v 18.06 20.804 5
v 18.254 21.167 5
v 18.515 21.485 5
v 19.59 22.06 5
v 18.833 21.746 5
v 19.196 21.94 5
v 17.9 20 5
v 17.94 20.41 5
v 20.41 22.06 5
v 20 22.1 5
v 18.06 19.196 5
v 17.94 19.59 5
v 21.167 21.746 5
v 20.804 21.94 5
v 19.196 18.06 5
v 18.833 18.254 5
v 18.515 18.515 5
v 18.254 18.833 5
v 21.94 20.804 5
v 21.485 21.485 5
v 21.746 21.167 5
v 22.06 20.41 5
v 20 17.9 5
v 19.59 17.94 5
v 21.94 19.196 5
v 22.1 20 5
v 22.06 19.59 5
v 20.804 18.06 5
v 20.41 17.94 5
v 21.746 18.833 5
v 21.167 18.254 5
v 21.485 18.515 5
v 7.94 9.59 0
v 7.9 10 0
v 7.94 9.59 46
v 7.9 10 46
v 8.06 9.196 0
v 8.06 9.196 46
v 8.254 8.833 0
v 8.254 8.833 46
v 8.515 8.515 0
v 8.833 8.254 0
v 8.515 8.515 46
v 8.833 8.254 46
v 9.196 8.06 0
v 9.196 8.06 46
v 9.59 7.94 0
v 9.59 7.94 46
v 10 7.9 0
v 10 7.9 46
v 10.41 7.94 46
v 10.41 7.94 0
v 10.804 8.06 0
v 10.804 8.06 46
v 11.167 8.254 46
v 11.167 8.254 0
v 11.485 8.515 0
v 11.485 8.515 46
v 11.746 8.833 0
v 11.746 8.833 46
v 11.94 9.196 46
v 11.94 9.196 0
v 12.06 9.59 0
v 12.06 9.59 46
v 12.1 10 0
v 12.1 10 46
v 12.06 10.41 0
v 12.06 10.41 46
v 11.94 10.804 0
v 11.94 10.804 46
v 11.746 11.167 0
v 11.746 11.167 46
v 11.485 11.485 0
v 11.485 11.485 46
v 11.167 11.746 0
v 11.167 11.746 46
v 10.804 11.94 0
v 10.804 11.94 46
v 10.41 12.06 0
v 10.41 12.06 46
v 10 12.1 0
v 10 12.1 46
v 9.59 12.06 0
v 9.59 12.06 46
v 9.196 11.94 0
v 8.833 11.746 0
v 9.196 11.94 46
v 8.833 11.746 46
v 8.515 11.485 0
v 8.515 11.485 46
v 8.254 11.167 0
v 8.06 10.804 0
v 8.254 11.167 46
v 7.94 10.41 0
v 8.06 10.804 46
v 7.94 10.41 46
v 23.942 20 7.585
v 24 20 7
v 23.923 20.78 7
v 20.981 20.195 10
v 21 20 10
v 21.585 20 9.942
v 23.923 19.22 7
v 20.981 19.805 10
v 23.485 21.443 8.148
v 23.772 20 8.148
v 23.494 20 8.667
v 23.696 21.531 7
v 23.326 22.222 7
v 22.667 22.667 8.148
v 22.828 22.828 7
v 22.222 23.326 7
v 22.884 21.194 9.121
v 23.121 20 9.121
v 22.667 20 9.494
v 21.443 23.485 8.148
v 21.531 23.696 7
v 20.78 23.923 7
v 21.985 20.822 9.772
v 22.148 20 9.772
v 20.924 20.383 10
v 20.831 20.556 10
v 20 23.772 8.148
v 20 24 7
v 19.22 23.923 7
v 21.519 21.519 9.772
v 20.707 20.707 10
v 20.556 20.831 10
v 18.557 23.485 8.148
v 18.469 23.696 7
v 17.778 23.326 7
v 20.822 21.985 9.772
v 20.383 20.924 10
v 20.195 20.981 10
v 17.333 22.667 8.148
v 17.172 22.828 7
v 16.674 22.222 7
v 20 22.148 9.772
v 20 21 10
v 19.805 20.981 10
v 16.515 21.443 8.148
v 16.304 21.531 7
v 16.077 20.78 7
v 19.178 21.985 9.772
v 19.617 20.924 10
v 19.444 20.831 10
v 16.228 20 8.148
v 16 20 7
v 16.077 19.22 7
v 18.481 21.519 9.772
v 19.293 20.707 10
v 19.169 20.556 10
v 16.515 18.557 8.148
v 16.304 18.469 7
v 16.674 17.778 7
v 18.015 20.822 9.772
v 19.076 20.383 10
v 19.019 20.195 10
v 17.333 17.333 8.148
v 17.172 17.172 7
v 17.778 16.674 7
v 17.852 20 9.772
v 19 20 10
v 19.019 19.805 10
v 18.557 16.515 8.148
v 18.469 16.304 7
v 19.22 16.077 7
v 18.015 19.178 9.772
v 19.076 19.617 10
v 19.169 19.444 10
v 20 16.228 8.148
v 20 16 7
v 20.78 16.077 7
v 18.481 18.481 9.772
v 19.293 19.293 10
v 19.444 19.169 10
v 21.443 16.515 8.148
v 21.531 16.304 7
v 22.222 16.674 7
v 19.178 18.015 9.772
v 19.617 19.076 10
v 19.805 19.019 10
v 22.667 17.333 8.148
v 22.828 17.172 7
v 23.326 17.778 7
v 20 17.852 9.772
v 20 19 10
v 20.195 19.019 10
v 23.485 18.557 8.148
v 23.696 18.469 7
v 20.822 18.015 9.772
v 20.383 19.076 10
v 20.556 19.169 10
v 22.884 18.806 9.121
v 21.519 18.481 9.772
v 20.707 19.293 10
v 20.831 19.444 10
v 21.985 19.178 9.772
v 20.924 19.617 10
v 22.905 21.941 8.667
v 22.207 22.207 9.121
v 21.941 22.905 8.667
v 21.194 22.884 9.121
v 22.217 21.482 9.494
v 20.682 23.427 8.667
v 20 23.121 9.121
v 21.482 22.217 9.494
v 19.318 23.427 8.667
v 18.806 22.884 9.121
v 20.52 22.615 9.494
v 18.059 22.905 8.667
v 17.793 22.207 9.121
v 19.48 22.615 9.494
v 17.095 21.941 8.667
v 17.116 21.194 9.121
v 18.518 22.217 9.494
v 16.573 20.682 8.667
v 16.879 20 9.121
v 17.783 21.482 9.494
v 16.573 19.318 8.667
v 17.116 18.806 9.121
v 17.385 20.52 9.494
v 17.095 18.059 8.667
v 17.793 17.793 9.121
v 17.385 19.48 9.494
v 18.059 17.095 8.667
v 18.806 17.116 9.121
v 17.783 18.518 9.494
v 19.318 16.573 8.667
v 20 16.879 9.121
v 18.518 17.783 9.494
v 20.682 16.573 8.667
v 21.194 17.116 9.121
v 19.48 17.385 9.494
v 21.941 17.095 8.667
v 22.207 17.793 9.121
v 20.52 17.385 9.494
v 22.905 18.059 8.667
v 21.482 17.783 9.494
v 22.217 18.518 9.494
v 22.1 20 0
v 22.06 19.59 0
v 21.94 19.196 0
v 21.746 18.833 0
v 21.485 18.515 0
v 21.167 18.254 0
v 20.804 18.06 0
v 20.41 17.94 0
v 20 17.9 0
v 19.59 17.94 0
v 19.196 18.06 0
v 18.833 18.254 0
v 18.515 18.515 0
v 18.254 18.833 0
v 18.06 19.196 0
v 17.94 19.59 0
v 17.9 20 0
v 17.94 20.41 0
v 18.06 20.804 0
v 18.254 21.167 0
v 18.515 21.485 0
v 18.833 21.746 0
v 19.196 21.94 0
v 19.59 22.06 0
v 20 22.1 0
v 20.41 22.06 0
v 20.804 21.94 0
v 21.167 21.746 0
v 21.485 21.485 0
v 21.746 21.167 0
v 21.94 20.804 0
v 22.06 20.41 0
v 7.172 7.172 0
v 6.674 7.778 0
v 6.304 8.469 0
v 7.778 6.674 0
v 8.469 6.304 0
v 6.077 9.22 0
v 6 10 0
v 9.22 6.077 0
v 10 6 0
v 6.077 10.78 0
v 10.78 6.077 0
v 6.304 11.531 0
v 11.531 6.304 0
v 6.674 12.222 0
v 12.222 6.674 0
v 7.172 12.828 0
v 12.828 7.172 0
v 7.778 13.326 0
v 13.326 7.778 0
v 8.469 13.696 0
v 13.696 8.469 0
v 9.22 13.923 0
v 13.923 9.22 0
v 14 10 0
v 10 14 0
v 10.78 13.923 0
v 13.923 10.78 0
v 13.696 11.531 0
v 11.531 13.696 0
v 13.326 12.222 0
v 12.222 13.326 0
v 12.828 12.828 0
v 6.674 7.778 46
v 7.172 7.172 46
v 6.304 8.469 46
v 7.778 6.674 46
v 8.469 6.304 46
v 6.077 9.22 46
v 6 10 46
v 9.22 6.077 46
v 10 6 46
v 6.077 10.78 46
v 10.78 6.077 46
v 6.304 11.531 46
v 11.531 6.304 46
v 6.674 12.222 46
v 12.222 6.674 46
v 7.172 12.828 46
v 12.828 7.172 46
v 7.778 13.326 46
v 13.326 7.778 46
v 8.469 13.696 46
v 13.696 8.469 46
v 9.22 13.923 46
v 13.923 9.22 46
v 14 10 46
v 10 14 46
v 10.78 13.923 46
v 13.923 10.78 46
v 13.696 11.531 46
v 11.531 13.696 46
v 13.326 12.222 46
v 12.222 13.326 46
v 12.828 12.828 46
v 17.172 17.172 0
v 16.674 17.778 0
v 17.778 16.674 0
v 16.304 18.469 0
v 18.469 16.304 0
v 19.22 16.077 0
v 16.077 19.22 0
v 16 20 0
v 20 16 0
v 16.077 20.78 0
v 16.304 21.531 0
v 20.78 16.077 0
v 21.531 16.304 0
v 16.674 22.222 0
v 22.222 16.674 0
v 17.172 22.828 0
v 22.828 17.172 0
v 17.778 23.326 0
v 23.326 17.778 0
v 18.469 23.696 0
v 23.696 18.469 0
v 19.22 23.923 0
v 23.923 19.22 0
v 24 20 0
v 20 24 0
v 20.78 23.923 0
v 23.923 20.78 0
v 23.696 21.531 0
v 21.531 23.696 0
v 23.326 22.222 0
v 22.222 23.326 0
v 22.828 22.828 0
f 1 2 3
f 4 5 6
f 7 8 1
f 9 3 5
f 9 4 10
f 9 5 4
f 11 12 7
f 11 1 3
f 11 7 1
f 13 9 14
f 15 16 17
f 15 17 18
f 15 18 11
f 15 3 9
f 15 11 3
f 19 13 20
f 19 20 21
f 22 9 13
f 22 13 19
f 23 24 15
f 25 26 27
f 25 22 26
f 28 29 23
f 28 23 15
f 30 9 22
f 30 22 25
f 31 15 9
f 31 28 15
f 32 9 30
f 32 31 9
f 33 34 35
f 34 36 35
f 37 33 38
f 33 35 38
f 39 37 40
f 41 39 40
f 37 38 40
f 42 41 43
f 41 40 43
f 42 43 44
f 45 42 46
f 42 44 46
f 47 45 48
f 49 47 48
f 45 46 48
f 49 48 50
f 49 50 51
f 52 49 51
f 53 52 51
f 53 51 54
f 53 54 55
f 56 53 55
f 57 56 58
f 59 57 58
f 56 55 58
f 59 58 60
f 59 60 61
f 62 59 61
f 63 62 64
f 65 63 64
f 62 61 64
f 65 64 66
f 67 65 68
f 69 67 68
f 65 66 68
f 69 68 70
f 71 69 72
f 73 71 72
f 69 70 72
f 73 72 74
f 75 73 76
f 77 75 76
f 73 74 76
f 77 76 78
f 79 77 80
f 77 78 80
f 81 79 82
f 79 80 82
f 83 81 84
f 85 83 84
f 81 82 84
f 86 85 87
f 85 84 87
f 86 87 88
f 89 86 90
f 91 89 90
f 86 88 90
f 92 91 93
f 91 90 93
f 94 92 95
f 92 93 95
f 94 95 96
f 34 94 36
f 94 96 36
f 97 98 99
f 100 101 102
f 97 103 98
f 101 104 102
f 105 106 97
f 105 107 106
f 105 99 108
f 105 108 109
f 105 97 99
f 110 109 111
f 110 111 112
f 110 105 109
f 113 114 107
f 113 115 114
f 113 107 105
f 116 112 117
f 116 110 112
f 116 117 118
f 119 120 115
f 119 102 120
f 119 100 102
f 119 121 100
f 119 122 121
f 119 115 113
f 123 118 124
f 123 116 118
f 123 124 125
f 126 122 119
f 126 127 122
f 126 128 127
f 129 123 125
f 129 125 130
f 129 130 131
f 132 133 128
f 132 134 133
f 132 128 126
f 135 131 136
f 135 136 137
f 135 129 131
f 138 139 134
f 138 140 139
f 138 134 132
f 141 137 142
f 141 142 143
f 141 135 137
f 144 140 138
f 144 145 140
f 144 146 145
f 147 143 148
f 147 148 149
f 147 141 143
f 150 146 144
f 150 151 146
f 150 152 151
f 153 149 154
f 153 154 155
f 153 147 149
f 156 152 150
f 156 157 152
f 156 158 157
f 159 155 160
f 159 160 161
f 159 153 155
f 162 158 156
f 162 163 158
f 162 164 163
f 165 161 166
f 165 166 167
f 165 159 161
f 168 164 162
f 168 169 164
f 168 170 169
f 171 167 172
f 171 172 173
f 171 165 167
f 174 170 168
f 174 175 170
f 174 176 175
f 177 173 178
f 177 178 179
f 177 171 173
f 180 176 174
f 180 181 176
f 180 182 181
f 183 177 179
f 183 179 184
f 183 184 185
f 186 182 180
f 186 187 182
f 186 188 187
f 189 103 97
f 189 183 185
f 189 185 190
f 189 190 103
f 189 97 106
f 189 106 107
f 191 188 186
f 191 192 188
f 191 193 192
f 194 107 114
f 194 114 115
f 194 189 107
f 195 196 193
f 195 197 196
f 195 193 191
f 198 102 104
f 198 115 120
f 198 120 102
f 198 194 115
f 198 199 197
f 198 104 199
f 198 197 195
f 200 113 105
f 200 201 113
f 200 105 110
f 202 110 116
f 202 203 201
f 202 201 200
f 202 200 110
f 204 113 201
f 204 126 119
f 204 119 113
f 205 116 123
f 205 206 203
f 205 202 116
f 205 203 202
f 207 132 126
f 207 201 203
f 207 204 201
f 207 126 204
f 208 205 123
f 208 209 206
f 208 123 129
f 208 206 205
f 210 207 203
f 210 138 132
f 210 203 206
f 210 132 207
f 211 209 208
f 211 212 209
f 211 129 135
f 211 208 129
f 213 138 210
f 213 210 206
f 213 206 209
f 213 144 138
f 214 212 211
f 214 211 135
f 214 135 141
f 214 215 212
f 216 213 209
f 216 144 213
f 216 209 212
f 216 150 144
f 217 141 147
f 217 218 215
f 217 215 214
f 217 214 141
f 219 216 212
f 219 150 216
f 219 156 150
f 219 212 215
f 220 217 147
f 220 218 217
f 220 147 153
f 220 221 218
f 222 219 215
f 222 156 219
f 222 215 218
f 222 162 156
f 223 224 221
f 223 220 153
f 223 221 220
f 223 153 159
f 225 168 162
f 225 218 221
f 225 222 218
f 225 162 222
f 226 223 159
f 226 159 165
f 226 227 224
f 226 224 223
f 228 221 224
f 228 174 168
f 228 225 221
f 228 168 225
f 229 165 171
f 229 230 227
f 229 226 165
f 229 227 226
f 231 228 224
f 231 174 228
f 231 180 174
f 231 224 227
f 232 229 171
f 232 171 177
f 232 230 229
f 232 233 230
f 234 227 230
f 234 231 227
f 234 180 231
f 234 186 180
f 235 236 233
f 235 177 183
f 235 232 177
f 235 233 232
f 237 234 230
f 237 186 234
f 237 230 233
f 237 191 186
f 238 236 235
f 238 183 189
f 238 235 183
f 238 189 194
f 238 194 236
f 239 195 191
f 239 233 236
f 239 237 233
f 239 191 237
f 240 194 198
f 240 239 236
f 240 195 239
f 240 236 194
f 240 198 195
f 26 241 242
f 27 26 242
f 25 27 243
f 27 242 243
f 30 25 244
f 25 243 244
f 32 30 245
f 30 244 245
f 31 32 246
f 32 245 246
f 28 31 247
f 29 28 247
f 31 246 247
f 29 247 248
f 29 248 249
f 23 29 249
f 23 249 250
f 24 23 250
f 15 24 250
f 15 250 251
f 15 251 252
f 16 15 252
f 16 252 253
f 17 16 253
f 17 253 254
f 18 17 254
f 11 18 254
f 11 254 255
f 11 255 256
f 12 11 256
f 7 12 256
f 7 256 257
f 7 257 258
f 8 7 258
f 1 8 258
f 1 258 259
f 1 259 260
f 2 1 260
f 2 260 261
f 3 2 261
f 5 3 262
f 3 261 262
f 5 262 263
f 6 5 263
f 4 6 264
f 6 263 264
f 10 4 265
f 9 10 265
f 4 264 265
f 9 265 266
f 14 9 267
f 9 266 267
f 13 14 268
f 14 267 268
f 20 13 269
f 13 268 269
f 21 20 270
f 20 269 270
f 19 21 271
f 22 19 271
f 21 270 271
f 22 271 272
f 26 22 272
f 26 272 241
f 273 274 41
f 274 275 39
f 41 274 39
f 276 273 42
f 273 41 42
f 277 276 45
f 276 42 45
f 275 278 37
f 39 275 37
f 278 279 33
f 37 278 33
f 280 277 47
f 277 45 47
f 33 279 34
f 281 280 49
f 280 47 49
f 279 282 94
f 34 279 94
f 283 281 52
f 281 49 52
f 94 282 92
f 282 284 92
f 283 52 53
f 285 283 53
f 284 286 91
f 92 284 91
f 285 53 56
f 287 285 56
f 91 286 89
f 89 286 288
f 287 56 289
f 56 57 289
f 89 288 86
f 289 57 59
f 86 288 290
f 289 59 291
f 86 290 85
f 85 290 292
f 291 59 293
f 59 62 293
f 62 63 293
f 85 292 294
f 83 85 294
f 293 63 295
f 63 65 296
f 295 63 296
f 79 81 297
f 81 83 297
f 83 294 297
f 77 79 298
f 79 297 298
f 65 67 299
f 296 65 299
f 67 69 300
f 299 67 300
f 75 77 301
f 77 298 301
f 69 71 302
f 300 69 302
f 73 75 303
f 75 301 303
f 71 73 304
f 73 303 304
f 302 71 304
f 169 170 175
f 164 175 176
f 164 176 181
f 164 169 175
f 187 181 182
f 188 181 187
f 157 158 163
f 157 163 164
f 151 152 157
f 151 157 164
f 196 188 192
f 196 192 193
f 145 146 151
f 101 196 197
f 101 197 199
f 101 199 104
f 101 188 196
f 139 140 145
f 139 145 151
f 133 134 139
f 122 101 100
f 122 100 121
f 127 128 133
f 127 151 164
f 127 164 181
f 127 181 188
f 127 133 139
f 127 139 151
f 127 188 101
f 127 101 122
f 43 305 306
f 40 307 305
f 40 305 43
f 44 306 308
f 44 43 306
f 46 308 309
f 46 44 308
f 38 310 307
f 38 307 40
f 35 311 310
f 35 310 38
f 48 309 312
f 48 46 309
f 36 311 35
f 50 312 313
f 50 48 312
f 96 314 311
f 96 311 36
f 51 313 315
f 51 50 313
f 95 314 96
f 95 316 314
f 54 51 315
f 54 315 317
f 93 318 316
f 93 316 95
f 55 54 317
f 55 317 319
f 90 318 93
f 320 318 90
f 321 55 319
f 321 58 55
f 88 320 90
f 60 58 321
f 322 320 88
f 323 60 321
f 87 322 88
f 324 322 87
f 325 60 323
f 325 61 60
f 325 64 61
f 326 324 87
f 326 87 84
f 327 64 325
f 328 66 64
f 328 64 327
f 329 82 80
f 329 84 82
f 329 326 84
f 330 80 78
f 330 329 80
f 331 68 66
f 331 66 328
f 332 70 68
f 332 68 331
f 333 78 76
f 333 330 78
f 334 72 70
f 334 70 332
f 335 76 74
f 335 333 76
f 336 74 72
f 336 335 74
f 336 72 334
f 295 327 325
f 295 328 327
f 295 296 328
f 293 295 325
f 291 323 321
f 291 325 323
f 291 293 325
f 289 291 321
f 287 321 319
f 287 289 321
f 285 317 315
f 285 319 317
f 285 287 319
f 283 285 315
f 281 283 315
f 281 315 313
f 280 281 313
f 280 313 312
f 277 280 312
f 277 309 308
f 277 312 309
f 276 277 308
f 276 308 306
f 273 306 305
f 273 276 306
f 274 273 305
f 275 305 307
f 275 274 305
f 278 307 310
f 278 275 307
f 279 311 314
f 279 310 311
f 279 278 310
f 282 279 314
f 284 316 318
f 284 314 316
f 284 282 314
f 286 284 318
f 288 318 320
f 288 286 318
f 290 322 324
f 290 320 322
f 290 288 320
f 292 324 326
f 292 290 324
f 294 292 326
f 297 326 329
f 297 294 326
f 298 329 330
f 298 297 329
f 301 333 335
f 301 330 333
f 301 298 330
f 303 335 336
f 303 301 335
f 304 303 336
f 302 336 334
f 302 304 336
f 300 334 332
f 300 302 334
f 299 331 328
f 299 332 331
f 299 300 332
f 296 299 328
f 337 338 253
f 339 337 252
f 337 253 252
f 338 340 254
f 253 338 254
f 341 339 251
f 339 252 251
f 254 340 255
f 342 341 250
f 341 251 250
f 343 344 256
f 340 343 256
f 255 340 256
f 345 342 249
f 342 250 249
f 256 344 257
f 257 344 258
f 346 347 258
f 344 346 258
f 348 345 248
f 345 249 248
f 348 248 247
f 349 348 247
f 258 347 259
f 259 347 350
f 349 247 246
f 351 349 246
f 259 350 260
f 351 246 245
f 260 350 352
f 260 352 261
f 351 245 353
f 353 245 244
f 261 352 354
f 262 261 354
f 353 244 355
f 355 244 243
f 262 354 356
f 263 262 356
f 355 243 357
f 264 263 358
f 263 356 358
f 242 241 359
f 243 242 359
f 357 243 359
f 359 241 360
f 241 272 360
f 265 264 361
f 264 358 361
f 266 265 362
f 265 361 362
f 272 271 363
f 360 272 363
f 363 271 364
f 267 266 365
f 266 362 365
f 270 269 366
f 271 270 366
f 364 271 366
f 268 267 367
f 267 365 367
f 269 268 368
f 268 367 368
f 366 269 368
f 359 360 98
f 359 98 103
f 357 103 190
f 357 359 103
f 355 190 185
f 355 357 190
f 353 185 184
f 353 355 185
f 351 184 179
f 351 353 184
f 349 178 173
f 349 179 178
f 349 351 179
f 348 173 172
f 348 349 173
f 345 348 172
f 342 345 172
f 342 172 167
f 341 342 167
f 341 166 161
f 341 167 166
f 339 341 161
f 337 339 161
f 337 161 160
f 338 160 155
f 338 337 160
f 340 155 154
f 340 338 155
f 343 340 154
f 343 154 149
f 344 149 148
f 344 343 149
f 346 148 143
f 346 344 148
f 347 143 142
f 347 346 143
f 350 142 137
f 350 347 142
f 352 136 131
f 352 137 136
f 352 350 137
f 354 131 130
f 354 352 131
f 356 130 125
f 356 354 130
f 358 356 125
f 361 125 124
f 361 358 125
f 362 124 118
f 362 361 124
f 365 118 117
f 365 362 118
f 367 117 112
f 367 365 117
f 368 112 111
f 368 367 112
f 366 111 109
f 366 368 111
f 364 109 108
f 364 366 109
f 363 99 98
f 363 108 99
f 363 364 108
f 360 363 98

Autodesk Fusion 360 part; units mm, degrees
sketch "Sketch1" plane through (0, 0, 0) normal (0, 0, 1) x (1, 0, 0)
  circle A0 centre (10, 10) radius 4
  dimension "d2" = 8
extrude "Extrude1" add sketch "Sketch1" along normal blind 46 makes body 1
sketch "Sketch2" plane through (0, 0, 46) normal (0, 0, 1) x (-1, 0, 0)
  circle A0 centre (-10, -10) radius 4
  circle A1 centre (-10, -10) radius 2.1
  dimension "d5" = 4.2
extrude "Extrude2" cut sketch "Sketch2" against normal blind 70 contours A1 bodies 1
sketch "Sketch3" plane through (0, 0, 0) normal (0, 0, 1) x (1, 0, 0)
  circle A0 centre (20, 20) radius 4
  dimension "d8" = 8
extrude "Extrude3" add sketch "Sketch3" along normal blind 10 separate body makes body 2
fillet "Fillet1" radius 3 1 edges at (16.2707, 18.5535, 10) on bodies 2
sketch "Sketch4" plane through (0, 0, 0) normal (0, 0, -1) x (1, 0, 0)
  circle A0 centre (20, -20) radius 4
  circle A1 centre (20, -20) radius 2.1
  dimension "d13" = 4.2
extrude "Extrude4" cut sketch "Sketch4" against normal blind 5 contours A1 bodies 2
